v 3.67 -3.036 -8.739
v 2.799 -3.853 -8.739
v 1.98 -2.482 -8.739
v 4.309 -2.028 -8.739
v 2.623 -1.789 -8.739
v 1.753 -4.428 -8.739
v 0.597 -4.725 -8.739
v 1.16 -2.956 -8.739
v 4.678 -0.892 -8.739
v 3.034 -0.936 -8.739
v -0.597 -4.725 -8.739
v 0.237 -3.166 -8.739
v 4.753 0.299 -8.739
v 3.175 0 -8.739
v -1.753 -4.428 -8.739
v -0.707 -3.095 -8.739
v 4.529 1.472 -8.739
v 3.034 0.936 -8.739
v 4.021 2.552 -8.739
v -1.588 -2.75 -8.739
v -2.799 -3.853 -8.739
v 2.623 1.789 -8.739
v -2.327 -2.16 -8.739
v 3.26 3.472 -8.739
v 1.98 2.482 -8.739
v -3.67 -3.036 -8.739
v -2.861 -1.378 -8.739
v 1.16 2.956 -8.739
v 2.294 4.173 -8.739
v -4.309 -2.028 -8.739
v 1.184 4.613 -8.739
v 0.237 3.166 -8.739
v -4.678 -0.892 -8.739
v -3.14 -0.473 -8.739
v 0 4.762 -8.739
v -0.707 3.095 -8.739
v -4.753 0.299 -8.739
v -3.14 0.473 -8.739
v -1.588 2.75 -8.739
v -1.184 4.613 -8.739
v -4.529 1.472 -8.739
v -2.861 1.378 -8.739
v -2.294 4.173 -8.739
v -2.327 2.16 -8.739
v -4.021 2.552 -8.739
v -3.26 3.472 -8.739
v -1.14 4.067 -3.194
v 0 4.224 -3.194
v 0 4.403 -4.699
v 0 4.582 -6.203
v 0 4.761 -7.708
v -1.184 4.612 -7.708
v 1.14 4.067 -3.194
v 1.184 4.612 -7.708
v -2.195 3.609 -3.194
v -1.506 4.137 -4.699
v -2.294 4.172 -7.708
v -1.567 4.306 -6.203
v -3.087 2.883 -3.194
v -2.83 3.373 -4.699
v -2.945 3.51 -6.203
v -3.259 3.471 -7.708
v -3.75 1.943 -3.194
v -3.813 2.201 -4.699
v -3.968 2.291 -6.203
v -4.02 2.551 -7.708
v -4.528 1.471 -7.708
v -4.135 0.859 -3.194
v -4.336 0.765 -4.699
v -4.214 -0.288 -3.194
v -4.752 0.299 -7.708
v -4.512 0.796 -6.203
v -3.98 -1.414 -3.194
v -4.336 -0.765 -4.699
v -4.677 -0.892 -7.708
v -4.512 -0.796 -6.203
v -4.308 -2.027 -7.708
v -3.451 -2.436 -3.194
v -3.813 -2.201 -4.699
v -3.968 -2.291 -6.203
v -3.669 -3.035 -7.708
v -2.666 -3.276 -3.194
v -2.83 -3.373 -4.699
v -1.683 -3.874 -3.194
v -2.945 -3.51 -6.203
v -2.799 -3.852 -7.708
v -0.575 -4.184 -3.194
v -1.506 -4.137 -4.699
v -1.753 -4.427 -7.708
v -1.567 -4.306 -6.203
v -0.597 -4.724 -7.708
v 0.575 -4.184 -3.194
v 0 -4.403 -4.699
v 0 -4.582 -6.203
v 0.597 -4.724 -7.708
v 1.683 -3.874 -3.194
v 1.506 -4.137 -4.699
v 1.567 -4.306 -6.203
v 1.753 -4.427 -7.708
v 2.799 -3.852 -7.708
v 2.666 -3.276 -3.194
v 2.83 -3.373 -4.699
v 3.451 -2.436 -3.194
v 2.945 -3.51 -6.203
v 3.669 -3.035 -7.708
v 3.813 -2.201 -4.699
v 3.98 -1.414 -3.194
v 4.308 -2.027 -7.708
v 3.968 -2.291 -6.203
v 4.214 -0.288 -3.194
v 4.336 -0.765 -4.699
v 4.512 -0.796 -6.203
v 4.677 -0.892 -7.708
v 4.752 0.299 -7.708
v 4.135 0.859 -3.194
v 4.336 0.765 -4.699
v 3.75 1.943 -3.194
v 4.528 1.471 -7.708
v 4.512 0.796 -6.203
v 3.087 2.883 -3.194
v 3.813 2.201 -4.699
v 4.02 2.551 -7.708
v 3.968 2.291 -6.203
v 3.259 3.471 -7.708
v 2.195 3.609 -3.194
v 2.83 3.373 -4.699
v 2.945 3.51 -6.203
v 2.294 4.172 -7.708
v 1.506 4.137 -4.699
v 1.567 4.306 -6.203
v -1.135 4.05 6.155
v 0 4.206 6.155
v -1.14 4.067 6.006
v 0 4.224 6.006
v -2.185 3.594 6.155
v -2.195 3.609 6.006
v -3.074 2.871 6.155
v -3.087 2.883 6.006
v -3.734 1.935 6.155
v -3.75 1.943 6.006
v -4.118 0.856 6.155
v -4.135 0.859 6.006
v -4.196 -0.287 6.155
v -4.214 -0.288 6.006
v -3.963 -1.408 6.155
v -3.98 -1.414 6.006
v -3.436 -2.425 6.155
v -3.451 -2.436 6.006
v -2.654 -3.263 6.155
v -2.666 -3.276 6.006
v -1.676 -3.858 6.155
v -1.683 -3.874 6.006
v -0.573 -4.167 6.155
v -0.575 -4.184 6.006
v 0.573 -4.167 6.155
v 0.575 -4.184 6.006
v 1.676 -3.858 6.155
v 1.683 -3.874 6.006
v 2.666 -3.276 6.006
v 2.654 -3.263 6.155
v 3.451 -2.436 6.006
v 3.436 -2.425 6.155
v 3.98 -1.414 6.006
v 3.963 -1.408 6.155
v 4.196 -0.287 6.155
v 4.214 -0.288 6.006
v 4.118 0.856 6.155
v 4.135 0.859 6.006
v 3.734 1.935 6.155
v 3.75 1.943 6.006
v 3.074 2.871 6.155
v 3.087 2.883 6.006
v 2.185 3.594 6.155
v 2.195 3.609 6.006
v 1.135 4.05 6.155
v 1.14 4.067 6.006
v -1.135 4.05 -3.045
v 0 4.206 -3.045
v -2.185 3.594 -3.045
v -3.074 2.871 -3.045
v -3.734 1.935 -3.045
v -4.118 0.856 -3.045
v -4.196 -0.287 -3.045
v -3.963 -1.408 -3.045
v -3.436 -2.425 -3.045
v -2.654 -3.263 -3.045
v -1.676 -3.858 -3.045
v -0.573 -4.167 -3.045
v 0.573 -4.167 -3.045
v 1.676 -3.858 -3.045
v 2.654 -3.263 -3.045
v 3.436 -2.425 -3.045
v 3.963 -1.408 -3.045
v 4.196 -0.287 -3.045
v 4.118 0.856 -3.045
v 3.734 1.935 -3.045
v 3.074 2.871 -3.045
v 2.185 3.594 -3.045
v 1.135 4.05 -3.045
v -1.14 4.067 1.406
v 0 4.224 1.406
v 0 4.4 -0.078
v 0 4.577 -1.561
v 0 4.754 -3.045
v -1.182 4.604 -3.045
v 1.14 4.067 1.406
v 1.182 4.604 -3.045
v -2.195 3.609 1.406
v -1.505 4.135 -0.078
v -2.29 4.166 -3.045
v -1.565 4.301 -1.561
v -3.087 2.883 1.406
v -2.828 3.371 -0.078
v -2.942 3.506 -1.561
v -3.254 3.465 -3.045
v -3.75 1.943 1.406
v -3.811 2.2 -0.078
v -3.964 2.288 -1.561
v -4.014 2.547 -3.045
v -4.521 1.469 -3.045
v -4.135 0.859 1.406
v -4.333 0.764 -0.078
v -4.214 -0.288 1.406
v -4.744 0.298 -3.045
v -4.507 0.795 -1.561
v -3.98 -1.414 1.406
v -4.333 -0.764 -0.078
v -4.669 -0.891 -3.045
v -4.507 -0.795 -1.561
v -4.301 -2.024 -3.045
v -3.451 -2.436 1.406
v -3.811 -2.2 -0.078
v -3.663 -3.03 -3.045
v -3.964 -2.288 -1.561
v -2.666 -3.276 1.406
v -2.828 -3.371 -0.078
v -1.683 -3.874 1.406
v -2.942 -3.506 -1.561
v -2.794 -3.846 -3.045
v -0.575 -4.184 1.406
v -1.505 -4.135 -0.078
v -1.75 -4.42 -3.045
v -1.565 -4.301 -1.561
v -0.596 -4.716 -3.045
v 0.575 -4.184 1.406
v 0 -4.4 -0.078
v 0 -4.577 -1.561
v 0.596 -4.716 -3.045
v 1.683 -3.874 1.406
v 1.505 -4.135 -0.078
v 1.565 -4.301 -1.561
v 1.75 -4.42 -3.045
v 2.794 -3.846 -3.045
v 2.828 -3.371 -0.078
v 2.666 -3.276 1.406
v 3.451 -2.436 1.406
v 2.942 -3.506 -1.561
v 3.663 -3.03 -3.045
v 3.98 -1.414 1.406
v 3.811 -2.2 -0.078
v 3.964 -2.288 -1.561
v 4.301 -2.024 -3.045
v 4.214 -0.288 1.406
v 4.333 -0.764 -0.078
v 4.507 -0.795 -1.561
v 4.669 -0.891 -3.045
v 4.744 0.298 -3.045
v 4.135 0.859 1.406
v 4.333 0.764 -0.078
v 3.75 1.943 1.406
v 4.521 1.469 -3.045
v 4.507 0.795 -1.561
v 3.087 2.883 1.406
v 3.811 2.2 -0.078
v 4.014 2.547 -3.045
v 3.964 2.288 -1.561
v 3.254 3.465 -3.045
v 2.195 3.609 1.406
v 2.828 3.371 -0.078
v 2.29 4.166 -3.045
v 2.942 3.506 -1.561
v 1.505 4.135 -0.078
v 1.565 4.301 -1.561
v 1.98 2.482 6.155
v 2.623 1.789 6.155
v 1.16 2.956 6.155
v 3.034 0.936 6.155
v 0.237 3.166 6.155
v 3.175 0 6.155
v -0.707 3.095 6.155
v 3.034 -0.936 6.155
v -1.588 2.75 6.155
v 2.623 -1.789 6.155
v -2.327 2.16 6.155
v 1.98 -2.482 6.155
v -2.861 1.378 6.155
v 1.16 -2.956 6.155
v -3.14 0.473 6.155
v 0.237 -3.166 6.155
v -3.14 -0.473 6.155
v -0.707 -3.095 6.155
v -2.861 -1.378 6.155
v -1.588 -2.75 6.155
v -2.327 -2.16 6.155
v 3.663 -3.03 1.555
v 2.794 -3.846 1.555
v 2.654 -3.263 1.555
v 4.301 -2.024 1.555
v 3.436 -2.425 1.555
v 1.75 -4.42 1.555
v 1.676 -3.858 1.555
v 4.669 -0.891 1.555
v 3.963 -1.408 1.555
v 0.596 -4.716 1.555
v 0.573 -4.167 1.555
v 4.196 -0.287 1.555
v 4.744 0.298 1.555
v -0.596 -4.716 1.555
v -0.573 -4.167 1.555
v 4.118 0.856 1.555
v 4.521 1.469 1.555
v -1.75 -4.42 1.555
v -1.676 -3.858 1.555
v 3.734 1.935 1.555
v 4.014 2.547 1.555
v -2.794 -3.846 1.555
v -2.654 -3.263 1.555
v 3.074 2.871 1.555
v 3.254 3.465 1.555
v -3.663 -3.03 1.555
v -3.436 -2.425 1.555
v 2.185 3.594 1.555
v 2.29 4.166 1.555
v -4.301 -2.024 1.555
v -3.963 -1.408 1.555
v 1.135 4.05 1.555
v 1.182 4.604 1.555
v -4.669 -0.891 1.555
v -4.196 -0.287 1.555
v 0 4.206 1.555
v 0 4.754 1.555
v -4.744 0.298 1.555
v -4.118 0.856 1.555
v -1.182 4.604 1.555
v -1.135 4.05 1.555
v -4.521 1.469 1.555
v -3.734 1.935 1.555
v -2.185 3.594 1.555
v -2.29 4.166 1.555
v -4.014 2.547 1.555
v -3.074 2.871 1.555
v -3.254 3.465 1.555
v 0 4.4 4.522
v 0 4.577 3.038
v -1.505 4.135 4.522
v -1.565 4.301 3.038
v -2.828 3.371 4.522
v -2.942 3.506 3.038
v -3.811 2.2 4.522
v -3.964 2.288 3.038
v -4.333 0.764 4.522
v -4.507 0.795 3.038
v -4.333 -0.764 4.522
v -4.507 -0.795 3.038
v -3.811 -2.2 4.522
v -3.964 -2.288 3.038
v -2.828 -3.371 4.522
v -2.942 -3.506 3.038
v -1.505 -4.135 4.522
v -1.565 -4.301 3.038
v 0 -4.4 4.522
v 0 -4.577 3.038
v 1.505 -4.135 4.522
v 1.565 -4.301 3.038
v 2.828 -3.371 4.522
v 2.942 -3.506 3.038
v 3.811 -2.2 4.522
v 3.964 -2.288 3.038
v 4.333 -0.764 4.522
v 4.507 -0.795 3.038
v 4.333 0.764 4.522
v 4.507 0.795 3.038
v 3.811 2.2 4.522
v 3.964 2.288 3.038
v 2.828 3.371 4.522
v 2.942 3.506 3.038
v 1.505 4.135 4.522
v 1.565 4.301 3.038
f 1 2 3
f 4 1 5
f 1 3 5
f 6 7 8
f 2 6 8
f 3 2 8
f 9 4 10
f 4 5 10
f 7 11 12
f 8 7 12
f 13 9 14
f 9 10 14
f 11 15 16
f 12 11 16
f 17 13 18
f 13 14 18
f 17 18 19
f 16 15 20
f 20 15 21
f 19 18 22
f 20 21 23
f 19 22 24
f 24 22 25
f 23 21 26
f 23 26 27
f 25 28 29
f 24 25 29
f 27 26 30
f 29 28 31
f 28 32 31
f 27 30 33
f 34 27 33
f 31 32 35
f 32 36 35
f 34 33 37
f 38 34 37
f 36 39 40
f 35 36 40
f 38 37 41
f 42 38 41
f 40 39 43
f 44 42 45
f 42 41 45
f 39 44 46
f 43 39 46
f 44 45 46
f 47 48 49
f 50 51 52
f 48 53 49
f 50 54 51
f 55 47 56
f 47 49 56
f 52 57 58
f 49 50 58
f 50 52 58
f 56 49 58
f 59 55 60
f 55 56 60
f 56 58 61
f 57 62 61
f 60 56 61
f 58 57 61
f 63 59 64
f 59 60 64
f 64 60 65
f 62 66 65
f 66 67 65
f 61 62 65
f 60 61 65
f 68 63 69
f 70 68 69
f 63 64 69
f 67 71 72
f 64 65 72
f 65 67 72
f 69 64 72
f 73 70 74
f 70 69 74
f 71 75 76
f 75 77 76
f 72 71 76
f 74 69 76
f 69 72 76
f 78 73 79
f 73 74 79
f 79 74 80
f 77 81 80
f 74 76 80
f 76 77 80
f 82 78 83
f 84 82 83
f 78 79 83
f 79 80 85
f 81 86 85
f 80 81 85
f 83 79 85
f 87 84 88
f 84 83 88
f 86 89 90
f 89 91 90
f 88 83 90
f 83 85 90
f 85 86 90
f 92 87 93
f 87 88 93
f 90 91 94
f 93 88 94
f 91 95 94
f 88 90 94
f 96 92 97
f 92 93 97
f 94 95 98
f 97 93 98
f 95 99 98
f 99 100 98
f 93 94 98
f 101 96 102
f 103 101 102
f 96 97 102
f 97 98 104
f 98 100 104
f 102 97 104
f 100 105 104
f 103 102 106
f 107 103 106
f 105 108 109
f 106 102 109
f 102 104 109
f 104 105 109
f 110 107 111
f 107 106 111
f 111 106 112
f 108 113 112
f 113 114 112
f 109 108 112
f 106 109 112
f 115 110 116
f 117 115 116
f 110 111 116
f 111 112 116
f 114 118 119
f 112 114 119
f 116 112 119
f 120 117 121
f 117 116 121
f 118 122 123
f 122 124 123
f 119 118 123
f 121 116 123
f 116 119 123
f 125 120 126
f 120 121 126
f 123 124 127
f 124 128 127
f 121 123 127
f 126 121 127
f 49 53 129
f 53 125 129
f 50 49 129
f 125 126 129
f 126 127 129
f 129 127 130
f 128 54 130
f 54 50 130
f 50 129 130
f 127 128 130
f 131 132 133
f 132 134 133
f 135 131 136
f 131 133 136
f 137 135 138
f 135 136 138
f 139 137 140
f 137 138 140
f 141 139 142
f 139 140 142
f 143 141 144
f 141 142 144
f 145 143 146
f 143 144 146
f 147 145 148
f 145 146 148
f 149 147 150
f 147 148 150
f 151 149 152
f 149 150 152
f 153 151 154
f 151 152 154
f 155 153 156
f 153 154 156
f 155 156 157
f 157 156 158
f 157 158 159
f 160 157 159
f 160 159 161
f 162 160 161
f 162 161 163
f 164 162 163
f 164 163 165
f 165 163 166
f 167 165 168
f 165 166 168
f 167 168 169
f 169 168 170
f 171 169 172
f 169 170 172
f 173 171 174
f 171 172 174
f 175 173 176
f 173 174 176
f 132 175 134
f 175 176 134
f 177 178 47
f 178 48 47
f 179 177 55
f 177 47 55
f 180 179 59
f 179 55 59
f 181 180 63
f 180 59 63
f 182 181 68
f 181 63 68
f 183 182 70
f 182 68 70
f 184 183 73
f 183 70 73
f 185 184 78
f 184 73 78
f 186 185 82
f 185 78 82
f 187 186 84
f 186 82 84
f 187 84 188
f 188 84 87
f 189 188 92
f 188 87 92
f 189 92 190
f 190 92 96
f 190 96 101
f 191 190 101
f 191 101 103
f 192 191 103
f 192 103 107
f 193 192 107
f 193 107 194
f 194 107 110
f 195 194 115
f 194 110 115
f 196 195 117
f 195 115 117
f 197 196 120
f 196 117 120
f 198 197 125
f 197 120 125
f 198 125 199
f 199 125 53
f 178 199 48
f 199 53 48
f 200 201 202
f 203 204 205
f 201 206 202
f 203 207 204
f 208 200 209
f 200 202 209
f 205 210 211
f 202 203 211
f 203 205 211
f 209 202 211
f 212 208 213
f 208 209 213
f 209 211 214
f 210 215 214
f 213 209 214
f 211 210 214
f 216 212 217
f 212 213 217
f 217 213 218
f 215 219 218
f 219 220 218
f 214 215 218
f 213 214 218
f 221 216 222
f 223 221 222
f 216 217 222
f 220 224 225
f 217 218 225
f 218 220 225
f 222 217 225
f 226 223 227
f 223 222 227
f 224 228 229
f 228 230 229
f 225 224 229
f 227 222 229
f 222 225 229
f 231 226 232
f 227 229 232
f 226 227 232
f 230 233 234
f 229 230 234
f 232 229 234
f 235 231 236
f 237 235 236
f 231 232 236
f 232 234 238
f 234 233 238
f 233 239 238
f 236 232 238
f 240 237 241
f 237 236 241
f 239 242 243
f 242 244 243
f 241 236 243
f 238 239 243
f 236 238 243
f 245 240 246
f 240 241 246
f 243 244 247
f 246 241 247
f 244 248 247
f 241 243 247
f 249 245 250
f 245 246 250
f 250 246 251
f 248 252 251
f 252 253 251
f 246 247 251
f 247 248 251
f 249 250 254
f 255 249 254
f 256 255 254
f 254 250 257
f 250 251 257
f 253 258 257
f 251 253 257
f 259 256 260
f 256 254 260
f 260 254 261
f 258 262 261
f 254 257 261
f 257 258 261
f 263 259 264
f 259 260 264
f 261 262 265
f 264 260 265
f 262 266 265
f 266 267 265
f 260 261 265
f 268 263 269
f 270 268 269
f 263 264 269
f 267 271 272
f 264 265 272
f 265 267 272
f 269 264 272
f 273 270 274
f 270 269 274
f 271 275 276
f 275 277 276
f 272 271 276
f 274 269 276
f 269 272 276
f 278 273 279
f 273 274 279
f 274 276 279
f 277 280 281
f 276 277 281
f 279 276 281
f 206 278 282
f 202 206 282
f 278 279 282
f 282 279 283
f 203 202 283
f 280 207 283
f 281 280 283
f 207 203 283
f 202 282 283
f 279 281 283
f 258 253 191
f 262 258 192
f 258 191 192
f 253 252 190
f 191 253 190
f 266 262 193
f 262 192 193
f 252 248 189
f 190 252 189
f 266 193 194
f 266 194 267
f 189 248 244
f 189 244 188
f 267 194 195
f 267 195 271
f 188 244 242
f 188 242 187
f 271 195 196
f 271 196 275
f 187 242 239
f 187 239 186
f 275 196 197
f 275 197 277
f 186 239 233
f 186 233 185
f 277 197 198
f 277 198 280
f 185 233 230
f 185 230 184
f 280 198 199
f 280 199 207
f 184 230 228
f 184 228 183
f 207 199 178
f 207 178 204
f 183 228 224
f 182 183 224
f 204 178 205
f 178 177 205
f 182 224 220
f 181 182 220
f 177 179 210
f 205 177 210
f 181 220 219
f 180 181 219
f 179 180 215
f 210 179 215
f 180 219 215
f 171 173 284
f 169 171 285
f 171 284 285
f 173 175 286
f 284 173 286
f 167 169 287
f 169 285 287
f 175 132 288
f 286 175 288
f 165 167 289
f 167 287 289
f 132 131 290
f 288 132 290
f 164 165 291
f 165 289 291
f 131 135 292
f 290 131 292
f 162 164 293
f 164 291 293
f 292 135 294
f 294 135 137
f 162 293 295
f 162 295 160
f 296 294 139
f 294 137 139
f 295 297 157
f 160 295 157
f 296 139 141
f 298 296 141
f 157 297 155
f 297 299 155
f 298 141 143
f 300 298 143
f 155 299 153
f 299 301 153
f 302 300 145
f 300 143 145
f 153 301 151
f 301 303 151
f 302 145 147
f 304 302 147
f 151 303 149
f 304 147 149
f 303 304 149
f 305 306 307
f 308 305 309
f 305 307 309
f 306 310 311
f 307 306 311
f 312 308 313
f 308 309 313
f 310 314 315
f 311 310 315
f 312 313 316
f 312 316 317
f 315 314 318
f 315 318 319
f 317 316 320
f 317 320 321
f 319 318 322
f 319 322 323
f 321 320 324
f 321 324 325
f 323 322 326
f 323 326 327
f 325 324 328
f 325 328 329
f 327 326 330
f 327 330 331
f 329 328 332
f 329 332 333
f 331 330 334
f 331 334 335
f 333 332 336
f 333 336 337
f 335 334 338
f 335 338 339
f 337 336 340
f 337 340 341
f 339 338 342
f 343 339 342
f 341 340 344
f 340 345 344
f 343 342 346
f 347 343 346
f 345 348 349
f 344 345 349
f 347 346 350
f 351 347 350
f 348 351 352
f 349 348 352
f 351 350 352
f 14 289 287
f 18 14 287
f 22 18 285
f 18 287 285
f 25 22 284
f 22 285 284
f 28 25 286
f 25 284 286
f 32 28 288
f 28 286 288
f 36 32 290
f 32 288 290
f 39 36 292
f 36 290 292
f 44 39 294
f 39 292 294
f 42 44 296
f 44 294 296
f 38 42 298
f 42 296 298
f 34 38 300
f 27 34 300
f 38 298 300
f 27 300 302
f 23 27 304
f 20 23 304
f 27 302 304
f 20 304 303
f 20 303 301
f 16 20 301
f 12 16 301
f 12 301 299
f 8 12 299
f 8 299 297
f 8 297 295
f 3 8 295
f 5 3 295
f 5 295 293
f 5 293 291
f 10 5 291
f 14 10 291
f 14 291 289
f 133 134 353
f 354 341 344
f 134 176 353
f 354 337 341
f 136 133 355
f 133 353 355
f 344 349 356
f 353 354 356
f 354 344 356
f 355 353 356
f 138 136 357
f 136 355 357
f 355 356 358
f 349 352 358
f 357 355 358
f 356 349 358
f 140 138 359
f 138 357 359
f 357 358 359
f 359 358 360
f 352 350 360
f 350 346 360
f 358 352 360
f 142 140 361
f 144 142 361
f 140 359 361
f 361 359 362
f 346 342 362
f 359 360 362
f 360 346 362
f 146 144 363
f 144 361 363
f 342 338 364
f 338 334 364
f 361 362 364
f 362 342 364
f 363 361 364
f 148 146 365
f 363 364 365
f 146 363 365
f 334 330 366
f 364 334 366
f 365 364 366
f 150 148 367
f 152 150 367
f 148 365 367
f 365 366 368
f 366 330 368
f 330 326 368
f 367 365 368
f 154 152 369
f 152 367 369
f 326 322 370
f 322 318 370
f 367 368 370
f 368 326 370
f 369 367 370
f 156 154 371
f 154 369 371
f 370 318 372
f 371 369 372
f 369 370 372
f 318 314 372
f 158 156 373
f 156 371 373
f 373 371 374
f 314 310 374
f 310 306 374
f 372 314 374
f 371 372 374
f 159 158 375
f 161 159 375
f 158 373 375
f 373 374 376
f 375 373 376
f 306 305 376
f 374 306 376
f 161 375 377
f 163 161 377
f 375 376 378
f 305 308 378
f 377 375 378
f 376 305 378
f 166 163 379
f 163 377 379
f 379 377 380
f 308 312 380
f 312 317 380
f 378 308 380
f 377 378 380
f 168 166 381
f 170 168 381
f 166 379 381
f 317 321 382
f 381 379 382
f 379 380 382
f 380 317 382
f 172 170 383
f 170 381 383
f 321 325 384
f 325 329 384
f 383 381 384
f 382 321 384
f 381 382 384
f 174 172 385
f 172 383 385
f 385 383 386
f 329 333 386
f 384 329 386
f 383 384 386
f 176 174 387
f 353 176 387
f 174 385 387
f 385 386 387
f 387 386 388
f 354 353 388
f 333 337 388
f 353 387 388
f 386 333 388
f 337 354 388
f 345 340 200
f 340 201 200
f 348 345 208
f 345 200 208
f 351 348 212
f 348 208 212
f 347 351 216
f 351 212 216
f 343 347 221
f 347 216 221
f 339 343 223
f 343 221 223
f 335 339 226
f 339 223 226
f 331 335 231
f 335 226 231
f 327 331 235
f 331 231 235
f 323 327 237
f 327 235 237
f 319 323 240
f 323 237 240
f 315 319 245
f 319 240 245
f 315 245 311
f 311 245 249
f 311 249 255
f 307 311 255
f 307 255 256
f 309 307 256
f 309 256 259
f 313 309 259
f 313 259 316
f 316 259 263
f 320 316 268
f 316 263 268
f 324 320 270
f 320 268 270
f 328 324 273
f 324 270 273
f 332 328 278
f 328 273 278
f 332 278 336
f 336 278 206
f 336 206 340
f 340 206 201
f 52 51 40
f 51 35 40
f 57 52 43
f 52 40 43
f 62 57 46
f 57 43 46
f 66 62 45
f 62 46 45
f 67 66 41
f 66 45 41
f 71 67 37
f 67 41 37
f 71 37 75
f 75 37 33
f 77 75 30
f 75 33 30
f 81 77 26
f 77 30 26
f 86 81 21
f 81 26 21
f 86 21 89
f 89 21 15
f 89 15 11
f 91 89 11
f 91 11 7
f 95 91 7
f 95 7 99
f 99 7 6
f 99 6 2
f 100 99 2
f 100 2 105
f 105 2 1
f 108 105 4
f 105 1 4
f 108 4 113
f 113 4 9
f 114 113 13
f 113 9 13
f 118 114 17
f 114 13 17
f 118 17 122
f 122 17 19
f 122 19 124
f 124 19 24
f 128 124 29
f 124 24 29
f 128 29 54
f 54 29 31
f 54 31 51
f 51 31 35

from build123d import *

# Parameters (mm, degrees)
SKETCH3_R          = 3.175
CUT_EXTRUDE1_DEPTH = 15.893870686


with BuildPart() as part:
    # Sketch2 → Barbfitting(Mcmaster) (revolve)
    with BuildSketch(Plane(origin=(0, 0, 0), x_dir=(0, 0, -1), z_dir=(1, 0, 0))):
        Polygon((8.7391875, 0), (-6.154683186, 0), (-6.154683186, 4.205934994), (-6.005566814, 4.223690006), (-1.554901936, 4.753622494), (-1.554901936, 4.205934994), (-1.405785564, 4.223690006), (3.044879314, 4.753622494), (3.044879314, 4.205934994), (3.193995686, 4.223690006), (7.707996691, 4.76116381), (8.7391875, 4.7625), align=None)
    revolve(axis=Axis((0, 0, -8.7391875), (0, 0, 1)))

    # Sketch3 → Cut-Extrude1 (cut, through all)
    with BuildSketch(Plane.XY.offset(6.154683186)):
        Circle(SKETCH3_R)
    extrude(amount=-CUT_EXTRUDE1_DEPTH, mode=Mode.SUBTRACT)


solid = part.part
